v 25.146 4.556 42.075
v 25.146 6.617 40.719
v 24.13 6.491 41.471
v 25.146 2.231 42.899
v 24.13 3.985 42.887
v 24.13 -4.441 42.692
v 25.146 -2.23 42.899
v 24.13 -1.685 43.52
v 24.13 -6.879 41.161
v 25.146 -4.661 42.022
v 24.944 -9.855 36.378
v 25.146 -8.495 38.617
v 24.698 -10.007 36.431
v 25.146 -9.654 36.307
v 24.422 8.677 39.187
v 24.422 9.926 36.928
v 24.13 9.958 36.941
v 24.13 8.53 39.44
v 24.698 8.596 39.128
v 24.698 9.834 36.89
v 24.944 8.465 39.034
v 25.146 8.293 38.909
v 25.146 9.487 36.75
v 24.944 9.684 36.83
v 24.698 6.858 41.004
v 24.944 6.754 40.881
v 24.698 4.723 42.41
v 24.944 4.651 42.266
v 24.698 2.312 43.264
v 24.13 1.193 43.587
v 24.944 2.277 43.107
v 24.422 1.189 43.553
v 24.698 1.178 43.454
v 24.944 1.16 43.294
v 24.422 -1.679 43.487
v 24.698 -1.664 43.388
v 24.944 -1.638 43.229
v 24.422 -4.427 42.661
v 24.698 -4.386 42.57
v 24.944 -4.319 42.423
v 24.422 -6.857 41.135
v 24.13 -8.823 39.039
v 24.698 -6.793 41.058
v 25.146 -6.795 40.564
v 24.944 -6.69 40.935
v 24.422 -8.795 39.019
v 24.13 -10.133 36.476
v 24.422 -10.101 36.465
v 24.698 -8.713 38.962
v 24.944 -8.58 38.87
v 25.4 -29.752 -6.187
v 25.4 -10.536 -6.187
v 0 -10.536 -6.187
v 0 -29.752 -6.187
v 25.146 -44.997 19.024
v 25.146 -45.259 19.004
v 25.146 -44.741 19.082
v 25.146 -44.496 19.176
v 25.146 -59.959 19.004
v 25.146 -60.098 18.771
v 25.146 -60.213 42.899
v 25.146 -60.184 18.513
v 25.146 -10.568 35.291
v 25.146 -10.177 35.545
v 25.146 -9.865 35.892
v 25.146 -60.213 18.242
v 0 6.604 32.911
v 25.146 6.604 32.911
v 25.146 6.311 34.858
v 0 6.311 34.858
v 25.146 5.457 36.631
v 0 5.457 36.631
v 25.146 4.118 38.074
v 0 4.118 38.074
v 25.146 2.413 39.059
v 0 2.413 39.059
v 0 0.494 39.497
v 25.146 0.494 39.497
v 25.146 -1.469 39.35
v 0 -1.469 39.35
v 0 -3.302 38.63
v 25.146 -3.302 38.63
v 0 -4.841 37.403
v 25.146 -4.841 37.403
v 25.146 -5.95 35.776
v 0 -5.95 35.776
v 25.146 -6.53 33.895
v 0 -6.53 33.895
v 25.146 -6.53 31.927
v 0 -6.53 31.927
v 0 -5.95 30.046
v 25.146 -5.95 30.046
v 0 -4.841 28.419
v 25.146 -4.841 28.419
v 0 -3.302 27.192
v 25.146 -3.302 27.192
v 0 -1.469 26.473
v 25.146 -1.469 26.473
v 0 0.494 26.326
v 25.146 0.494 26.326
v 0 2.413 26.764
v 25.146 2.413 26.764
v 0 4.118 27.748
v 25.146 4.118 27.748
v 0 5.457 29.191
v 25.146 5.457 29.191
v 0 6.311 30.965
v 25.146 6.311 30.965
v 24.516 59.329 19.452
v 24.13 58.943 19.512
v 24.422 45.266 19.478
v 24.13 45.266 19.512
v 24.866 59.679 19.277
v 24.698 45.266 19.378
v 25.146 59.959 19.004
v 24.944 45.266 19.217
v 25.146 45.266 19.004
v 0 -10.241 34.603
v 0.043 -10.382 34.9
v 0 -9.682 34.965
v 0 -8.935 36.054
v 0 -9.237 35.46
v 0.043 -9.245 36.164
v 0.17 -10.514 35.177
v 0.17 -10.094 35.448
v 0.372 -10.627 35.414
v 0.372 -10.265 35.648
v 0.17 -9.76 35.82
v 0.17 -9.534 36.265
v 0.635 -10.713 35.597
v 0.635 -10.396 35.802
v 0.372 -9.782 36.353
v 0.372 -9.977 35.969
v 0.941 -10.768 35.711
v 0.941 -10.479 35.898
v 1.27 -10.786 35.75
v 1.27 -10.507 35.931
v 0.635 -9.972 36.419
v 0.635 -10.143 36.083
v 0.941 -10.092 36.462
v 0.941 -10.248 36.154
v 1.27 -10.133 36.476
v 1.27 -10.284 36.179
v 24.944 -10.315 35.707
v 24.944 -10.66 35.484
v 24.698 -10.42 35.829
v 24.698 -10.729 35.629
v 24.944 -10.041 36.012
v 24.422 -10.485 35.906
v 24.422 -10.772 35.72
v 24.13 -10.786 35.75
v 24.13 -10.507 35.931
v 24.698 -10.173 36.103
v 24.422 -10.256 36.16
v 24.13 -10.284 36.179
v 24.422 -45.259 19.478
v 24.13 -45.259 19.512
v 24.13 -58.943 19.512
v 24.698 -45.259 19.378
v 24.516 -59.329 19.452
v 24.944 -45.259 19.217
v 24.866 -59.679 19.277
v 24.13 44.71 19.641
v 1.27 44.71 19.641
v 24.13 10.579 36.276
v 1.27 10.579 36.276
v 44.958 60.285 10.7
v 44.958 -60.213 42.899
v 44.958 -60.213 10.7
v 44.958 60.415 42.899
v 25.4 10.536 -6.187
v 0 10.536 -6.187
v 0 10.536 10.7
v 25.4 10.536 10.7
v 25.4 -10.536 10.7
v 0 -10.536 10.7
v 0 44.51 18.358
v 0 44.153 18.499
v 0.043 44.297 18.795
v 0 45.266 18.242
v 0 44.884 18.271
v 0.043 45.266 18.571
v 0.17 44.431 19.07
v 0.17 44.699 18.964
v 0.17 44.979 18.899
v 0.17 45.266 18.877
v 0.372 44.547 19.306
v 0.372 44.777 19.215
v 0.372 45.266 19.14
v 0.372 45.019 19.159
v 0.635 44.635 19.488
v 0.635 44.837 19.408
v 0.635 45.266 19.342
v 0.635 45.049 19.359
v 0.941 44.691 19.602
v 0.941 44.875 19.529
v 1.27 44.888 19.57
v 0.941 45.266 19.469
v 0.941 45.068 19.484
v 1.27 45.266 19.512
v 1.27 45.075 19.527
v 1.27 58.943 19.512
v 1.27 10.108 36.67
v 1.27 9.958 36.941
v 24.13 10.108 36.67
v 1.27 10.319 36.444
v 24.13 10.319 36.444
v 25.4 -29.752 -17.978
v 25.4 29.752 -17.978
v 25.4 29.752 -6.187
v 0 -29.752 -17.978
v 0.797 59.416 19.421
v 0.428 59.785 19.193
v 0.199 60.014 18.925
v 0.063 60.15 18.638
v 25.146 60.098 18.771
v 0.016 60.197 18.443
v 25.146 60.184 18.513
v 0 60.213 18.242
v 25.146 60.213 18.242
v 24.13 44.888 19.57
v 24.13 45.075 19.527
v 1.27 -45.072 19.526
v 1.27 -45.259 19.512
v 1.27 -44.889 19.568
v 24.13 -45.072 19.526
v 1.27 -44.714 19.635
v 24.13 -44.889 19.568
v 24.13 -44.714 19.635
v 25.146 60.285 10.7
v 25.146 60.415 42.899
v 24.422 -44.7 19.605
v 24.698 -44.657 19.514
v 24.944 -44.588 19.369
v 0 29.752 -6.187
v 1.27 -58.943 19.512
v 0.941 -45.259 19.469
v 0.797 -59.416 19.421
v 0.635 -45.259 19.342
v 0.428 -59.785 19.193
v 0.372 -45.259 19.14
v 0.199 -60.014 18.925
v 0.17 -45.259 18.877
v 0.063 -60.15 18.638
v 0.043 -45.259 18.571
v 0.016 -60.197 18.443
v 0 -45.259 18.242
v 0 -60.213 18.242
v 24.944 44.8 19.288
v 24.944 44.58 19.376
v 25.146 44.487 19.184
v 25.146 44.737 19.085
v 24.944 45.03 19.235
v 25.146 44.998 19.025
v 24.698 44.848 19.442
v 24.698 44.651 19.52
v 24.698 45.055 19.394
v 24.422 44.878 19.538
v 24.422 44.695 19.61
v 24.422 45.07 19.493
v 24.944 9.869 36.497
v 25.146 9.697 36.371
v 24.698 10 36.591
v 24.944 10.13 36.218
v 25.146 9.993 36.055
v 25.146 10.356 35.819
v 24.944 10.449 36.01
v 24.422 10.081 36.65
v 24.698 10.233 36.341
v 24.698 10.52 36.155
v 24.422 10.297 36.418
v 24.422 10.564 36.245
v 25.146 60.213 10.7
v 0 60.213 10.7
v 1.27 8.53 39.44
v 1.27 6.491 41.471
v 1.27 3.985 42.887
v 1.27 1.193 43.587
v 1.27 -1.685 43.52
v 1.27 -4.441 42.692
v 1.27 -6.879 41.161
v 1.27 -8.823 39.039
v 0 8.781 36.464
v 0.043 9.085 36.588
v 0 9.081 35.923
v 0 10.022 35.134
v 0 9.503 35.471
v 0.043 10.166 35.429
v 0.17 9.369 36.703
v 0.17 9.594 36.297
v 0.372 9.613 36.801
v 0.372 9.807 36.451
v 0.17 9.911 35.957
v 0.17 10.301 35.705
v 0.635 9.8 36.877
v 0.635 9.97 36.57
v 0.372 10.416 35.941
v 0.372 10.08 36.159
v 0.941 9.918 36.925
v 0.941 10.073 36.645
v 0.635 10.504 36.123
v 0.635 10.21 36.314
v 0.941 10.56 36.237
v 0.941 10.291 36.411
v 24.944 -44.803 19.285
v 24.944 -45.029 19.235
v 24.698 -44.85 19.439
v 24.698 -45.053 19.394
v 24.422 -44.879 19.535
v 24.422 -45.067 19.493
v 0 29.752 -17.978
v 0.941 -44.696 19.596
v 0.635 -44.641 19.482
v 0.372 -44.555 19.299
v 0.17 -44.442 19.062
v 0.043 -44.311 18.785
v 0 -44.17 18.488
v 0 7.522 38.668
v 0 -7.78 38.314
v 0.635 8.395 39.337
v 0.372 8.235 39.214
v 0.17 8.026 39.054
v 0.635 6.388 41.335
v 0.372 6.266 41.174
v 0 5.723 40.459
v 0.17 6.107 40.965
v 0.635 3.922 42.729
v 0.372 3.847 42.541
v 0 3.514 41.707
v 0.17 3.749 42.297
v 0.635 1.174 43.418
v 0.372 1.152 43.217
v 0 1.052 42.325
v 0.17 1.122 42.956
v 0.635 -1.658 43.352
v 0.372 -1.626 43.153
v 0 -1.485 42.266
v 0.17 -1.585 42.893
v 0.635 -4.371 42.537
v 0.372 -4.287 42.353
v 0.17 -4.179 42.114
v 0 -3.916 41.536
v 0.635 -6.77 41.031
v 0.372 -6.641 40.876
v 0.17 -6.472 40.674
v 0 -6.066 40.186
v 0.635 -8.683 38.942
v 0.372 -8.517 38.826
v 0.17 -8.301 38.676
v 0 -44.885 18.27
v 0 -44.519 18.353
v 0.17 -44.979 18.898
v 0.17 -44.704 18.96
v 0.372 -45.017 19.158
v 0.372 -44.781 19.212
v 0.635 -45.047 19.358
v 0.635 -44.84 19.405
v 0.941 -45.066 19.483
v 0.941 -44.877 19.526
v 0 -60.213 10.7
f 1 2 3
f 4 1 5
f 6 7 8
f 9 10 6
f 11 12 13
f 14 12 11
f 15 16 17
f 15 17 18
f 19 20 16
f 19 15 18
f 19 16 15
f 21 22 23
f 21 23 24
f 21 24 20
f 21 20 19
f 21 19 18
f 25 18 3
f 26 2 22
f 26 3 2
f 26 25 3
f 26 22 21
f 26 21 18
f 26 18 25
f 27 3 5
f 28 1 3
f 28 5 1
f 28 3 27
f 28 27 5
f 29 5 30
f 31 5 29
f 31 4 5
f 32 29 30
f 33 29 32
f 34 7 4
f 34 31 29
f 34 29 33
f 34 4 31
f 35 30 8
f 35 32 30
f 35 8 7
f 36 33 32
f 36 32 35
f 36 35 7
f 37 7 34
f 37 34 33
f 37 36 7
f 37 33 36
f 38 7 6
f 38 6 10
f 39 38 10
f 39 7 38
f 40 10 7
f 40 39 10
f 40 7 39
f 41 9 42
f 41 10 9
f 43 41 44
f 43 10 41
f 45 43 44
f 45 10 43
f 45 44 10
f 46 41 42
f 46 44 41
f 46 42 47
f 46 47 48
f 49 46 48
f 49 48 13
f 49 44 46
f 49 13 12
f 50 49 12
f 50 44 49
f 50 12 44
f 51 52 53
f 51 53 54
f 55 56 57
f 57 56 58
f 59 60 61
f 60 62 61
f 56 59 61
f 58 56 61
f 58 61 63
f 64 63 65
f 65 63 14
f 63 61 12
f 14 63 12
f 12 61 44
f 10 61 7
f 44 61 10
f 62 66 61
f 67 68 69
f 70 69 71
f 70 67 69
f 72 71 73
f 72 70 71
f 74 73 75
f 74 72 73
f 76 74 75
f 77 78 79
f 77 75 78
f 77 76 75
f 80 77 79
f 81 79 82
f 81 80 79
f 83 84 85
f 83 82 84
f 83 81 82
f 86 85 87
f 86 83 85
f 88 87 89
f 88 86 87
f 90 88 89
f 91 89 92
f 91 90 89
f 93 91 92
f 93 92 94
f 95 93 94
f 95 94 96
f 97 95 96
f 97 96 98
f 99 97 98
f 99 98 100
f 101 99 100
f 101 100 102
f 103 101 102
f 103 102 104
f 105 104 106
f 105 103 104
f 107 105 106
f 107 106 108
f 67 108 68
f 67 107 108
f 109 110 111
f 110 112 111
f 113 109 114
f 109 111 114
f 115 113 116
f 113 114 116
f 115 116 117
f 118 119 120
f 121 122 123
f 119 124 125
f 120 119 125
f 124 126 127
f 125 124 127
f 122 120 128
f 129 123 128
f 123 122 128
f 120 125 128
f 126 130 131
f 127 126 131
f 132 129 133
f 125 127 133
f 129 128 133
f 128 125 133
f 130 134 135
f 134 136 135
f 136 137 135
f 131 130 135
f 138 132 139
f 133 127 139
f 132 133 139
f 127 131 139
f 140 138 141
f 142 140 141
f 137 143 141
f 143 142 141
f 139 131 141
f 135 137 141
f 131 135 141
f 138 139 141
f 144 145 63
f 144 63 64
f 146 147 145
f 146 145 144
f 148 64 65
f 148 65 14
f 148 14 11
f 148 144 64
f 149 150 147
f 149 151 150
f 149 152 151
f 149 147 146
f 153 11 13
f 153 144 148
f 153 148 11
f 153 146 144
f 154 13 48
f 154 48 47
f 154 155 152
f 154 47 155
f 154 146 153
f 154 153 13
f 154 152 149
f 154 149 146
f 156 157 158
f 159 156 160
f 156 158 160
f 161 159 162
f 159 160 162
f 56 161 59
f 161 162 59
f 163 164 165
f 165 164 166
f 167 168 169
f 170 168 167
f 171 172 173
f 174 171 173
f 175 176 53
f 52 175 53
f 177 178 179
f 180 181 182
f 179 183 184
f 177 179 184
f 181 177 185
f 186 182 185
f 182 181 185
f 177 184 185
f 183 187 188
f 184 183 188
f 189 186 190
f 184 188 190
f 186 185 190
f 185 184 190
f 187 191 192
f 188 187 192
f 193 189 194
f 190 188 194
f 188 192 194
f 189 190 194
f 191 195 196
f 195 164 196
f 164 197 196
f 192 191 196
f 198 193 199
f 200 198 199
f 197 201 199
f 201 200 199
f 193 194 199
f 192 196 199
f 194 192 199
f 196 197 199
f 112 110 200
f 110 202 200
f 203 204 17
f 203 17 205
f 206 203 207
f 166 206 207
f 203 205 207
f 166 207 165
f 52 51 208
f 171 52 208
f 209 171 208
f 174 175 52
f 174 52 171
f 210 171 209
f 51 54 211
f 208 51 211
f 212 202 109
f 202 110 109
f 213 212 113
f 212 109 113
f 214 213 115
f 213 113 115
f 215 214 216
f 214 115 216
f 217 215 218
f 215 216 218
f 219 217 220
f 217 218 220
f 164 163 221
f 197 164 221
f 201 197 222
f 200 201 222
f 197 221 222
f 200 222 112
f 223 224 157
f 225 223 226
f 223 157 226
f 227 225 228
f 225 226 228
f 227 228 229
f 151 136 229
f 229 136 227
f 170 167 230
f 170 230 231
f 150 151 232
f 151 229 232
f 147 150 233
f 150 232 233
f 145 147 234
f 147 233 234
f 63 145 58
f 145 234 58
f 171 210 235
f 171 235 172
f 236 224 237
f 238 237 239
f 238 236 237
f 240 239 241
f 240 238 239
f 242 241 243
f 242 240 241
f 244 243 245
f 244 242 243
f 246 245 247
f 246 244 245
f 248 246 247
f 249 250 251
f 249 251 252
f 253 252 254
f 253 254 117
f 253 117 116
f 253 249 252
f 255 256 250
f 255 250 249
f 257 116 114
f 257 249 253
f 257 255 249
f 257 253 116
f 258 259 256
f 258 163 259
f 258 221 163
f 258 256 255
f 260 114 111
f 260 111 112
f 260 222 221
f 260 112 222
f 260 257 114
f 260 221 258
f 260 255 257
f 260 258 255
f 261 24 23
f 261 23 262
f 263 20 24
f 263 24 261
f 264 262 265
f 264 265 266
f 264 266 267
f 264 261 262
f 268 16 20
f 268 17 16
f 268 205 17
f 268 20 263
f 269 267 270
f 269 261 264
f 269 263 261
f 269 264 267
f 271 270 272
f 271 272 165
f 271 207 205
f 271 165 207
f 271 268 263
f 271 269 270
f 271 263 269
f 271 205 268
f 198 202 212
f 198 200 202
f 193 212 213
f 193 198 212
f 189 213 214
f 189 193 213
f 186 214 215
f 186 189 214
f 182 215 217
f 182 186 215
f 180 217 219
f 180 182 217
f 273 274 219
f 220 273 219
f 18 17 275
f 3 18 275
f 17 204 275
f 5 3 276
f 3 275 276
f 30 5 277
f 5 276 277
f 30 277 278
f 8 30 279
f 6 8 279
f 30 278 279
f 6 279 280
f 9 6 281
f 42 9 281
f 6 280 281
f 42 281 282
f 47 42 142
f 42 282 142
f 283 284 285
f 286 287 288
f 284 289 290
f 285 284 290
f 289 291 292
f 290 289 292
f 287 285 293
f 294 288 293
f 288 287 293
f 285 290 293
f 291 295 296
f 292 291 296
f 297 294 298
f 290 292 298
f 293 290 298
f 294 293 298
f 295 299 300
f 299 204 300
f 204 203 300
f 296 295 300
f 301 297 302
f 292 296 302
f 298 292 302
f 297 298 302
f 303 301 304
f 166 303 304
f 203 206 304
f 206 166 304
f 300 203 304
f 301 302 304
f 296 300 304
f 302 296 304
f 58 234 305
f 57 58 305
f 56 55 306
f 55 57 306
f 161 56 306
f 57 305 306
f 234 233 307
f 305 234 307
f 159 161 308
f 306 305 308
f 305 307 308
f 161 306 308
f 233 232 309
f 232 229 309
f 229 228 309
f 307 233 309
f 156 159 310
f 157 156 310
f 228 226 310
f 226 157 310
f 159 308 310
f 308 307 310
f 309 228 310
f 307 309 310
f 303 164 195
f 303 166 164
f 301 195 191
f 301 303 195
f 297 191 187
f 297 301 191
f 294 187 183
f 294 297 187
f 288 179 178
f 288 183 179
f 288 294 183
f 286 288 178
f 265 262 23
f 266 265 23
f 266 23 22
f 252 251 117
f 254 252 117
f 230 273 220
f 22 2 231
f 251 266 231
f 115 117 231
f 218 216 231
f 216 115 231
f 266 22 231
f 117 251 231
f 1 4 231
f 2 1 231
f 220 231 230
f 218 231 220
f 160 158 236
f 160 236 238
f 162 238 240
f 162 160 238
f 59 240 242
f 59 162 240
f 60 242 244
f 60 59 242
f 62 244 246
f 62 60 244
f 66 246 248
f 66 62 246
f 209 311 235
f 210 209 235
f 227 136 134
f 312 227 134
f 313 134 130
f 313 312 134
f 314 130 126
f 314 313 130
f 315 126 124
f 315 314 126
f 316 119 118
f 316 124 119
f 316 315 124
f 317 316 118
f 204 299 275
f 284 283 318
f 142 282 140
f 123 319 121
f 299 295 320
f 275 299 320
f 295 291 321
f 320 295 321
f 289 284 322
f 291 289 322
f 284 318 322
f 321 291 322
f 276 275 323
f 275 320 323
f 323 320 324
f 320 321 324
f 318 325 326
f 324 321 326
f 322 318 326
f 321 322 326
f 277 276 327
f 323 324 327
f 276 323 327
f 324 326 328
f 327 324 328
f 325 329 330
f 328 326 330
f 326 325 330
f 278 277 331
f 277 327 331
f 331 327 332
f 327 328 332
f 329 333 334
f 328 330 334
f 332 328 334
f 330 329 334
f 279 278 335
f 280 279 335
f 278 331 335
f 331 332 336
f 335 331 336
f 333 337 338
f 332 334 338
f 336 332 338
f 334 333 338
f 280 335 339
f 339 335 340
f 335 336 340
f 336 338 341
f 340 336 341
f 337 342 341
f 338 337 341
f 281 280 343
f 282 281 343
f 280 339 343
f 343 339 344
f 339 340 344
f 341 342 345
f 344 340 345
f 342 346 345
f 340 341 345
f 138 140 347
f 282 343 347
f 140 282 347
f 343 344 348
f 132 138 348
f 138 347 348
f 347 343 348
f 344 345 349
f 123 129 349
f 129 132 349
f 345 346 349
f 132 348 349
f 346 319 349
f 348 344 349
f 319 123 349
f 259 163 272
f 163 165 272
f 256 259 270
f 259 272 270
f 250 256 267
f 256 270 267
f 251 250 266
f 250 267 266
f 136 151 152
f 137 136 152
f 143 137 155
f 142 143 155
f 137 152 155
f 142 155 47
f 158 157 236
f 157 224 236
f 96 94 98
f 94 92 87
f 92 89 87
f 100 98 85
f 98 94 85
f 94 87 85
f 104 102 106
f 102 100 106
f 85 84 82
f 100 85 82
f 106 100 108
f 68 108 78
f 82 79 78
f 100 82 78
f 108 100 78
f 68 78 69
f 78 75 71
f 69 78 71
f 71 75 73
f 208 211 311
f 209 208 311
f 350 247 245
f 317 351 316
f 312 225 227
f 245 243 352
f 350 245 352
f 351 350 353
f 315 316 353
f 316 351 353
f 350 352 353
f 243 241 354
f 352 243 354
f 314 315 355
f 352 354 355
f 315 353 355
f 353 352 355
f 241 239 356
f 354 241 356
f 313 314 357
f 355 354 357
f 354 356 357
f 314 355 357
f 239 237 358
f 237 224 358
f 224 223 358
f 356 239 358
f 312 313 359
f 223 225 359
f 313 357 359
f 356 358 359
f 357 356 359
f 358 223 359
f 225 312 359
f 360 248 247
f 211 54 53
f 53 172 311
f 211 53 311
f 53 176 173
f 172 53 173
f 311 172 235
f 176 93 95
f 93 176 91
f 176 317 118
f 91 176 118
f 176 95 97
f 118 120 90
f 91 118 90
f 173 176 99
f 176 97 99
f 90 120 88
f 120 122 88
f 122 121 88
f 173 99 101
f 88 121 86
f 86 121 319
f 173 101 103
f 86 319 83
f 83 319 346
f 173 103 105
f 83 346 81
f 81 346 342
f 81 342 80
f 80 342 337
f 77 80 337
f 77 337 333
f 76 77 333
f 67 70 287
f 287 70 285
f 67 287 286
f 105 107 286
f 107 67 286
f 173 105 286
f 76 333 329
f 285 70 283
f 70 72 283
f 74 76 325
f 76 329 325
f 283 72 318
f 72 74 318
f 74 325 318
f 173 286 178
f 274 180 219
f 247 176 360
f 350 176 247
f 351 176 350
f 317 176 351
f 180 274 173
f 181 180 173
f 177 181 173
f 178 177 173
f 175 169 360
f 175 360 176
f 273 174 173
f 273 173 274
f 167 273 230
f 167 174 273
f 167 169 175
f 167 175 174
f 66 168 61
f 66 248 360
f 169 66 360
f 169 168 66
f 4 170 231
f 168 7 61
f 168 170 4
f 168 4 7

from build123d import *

# Parameters (mm, degrees)
F0_R     = 6.604
F1_DEPTH = 25.4
F2_R     = 1.27
F5_DEPTH = 19.812


with BuildPart() as f1:
    # F0 (on Right) → F1 (new body)
    with BuildSketch(Plane.YZ):
        with BuildLine():
            Line((-44.9730095259, 19.512440572), (-60.2130095259, 19.512440572))
            Line((-60.2130095259, 19.512440572), (-60.2130095259, 10.6997340918))
            Line((-60.2130095259, 10.6997340918), (-10.535961017, 10.6997340918))
            Line((-10.535961017, 10.6997340918), (-10.535961017, -6.1869150959))
            Line((-10.535961017, -6.1869150959), (-29.7518018633, -6.1869150959))
            Line((-29.7518018633, -6.1869150959), (-29.7518018633, -17.9784540087))
            Line((-29.7518018633, -17.9784540087), (0, -17.9784540087))
            Line((0, -17.9784540087), (29.7518018633, -17.9784540087))
            Line((29.7518018633, -17.9784540087), (29.7518018633, -6.1869150959))
            Line((29.7518018633, -6.1869150959), (10.535961017, -6.1869150959))
            Line((10.535961017, -6.1869150959), (10.535961017, 10.6997340918))
            Line((10.535961017, 10.6997340918), (60.2130095259, 10.6997340918))
            Line((60.2130095259, 10.6997340918), (60.2130095259, 19.512440572))
            Line((60.2130095259, 19.512440572), (44.9730095259, 19.512440572))
            Line((44.9730095259, 19.512440572), (10.1265067253, 36.4959567288))
            ThreePointArc((10.1265067253, 36.4959567288), (10.587250916, 34.7297929897), (10.7423247602, 32.911119939))
            ThreePointArc((10.7423247602, 32.911119939), (-1.5527814637, 22.281940137), (-10.2926816094, 35.9846130792))
            Line((-10.2926816094, 35.9846130792), (-44.9730095259, 19.512440572))
        make_face()
        with BuildLine():
            ThreePointArc((10.1265067253, 36.4959567288), (-0.2686387048, 43.6497954823), (-10.2926816094, 35.9846130792))
            ThreePointArc((-10.2926816094, 35.9846130792), (-1.5527814637, 22.281940137), (10.7423247602, 32.911119939))
            ThreePointArc((10.7423247602, 32.911119939), (10.587250916, 34.7297929897), (10.1265067253, 36.4959567288))
        make_face()
        with Locations((0.0002825399, 32.911119939)):
            Circle(F0_R, mode=Mode.SUBTRACT)
    extrude(amount=F1_DEPTH)

    # F2
    f2_edges = [f1.edges().sort_by_distance(p)[0] for p in [
        (25.4, -27.632846, 27.748527),
        (25.4, -0.268639, 43.649795),
        (25.4, 27.549758, 28.004199),
        (25.4, 52.59301, 19.512441),
        (25.4, -52.59301, 19.512441),
        (12.7, -44.97301, 19.512441),
        (12.7, -60.21301, 19.512441),
        (0, -52.59301, 19.512441),
        (0, -27.632846, 27.748527),
        (0, -0.268639, 43.649795),
        (0, 27.549758, 28.004199),
        (0, 52.59301, 19.512441),
        (12.7, 60.21301, 19.512441),
        (12.7, 44.97301, 19.512441),
        (12.7, -10.292682, 35.984613),
        (12.7, 10.126507, 36.495957),
    ]]
    fillet(f2_edges, radius=F2_R)

    # F4 (on offset) → F5 (join)
    with BuildSketch(Plane.YZ.offset(44.958)):
        Polygon((-60.2130095259, 42.8991168737), (-60.2130095259, 18.242440572), (-60.2130095259, 10.6997340918), (60.2849709341, 10.6997340918), (60.4153525641, 42.8991168737), align=None)
    extrude(amount=-F5_DEPTH)


solid = f1.part
